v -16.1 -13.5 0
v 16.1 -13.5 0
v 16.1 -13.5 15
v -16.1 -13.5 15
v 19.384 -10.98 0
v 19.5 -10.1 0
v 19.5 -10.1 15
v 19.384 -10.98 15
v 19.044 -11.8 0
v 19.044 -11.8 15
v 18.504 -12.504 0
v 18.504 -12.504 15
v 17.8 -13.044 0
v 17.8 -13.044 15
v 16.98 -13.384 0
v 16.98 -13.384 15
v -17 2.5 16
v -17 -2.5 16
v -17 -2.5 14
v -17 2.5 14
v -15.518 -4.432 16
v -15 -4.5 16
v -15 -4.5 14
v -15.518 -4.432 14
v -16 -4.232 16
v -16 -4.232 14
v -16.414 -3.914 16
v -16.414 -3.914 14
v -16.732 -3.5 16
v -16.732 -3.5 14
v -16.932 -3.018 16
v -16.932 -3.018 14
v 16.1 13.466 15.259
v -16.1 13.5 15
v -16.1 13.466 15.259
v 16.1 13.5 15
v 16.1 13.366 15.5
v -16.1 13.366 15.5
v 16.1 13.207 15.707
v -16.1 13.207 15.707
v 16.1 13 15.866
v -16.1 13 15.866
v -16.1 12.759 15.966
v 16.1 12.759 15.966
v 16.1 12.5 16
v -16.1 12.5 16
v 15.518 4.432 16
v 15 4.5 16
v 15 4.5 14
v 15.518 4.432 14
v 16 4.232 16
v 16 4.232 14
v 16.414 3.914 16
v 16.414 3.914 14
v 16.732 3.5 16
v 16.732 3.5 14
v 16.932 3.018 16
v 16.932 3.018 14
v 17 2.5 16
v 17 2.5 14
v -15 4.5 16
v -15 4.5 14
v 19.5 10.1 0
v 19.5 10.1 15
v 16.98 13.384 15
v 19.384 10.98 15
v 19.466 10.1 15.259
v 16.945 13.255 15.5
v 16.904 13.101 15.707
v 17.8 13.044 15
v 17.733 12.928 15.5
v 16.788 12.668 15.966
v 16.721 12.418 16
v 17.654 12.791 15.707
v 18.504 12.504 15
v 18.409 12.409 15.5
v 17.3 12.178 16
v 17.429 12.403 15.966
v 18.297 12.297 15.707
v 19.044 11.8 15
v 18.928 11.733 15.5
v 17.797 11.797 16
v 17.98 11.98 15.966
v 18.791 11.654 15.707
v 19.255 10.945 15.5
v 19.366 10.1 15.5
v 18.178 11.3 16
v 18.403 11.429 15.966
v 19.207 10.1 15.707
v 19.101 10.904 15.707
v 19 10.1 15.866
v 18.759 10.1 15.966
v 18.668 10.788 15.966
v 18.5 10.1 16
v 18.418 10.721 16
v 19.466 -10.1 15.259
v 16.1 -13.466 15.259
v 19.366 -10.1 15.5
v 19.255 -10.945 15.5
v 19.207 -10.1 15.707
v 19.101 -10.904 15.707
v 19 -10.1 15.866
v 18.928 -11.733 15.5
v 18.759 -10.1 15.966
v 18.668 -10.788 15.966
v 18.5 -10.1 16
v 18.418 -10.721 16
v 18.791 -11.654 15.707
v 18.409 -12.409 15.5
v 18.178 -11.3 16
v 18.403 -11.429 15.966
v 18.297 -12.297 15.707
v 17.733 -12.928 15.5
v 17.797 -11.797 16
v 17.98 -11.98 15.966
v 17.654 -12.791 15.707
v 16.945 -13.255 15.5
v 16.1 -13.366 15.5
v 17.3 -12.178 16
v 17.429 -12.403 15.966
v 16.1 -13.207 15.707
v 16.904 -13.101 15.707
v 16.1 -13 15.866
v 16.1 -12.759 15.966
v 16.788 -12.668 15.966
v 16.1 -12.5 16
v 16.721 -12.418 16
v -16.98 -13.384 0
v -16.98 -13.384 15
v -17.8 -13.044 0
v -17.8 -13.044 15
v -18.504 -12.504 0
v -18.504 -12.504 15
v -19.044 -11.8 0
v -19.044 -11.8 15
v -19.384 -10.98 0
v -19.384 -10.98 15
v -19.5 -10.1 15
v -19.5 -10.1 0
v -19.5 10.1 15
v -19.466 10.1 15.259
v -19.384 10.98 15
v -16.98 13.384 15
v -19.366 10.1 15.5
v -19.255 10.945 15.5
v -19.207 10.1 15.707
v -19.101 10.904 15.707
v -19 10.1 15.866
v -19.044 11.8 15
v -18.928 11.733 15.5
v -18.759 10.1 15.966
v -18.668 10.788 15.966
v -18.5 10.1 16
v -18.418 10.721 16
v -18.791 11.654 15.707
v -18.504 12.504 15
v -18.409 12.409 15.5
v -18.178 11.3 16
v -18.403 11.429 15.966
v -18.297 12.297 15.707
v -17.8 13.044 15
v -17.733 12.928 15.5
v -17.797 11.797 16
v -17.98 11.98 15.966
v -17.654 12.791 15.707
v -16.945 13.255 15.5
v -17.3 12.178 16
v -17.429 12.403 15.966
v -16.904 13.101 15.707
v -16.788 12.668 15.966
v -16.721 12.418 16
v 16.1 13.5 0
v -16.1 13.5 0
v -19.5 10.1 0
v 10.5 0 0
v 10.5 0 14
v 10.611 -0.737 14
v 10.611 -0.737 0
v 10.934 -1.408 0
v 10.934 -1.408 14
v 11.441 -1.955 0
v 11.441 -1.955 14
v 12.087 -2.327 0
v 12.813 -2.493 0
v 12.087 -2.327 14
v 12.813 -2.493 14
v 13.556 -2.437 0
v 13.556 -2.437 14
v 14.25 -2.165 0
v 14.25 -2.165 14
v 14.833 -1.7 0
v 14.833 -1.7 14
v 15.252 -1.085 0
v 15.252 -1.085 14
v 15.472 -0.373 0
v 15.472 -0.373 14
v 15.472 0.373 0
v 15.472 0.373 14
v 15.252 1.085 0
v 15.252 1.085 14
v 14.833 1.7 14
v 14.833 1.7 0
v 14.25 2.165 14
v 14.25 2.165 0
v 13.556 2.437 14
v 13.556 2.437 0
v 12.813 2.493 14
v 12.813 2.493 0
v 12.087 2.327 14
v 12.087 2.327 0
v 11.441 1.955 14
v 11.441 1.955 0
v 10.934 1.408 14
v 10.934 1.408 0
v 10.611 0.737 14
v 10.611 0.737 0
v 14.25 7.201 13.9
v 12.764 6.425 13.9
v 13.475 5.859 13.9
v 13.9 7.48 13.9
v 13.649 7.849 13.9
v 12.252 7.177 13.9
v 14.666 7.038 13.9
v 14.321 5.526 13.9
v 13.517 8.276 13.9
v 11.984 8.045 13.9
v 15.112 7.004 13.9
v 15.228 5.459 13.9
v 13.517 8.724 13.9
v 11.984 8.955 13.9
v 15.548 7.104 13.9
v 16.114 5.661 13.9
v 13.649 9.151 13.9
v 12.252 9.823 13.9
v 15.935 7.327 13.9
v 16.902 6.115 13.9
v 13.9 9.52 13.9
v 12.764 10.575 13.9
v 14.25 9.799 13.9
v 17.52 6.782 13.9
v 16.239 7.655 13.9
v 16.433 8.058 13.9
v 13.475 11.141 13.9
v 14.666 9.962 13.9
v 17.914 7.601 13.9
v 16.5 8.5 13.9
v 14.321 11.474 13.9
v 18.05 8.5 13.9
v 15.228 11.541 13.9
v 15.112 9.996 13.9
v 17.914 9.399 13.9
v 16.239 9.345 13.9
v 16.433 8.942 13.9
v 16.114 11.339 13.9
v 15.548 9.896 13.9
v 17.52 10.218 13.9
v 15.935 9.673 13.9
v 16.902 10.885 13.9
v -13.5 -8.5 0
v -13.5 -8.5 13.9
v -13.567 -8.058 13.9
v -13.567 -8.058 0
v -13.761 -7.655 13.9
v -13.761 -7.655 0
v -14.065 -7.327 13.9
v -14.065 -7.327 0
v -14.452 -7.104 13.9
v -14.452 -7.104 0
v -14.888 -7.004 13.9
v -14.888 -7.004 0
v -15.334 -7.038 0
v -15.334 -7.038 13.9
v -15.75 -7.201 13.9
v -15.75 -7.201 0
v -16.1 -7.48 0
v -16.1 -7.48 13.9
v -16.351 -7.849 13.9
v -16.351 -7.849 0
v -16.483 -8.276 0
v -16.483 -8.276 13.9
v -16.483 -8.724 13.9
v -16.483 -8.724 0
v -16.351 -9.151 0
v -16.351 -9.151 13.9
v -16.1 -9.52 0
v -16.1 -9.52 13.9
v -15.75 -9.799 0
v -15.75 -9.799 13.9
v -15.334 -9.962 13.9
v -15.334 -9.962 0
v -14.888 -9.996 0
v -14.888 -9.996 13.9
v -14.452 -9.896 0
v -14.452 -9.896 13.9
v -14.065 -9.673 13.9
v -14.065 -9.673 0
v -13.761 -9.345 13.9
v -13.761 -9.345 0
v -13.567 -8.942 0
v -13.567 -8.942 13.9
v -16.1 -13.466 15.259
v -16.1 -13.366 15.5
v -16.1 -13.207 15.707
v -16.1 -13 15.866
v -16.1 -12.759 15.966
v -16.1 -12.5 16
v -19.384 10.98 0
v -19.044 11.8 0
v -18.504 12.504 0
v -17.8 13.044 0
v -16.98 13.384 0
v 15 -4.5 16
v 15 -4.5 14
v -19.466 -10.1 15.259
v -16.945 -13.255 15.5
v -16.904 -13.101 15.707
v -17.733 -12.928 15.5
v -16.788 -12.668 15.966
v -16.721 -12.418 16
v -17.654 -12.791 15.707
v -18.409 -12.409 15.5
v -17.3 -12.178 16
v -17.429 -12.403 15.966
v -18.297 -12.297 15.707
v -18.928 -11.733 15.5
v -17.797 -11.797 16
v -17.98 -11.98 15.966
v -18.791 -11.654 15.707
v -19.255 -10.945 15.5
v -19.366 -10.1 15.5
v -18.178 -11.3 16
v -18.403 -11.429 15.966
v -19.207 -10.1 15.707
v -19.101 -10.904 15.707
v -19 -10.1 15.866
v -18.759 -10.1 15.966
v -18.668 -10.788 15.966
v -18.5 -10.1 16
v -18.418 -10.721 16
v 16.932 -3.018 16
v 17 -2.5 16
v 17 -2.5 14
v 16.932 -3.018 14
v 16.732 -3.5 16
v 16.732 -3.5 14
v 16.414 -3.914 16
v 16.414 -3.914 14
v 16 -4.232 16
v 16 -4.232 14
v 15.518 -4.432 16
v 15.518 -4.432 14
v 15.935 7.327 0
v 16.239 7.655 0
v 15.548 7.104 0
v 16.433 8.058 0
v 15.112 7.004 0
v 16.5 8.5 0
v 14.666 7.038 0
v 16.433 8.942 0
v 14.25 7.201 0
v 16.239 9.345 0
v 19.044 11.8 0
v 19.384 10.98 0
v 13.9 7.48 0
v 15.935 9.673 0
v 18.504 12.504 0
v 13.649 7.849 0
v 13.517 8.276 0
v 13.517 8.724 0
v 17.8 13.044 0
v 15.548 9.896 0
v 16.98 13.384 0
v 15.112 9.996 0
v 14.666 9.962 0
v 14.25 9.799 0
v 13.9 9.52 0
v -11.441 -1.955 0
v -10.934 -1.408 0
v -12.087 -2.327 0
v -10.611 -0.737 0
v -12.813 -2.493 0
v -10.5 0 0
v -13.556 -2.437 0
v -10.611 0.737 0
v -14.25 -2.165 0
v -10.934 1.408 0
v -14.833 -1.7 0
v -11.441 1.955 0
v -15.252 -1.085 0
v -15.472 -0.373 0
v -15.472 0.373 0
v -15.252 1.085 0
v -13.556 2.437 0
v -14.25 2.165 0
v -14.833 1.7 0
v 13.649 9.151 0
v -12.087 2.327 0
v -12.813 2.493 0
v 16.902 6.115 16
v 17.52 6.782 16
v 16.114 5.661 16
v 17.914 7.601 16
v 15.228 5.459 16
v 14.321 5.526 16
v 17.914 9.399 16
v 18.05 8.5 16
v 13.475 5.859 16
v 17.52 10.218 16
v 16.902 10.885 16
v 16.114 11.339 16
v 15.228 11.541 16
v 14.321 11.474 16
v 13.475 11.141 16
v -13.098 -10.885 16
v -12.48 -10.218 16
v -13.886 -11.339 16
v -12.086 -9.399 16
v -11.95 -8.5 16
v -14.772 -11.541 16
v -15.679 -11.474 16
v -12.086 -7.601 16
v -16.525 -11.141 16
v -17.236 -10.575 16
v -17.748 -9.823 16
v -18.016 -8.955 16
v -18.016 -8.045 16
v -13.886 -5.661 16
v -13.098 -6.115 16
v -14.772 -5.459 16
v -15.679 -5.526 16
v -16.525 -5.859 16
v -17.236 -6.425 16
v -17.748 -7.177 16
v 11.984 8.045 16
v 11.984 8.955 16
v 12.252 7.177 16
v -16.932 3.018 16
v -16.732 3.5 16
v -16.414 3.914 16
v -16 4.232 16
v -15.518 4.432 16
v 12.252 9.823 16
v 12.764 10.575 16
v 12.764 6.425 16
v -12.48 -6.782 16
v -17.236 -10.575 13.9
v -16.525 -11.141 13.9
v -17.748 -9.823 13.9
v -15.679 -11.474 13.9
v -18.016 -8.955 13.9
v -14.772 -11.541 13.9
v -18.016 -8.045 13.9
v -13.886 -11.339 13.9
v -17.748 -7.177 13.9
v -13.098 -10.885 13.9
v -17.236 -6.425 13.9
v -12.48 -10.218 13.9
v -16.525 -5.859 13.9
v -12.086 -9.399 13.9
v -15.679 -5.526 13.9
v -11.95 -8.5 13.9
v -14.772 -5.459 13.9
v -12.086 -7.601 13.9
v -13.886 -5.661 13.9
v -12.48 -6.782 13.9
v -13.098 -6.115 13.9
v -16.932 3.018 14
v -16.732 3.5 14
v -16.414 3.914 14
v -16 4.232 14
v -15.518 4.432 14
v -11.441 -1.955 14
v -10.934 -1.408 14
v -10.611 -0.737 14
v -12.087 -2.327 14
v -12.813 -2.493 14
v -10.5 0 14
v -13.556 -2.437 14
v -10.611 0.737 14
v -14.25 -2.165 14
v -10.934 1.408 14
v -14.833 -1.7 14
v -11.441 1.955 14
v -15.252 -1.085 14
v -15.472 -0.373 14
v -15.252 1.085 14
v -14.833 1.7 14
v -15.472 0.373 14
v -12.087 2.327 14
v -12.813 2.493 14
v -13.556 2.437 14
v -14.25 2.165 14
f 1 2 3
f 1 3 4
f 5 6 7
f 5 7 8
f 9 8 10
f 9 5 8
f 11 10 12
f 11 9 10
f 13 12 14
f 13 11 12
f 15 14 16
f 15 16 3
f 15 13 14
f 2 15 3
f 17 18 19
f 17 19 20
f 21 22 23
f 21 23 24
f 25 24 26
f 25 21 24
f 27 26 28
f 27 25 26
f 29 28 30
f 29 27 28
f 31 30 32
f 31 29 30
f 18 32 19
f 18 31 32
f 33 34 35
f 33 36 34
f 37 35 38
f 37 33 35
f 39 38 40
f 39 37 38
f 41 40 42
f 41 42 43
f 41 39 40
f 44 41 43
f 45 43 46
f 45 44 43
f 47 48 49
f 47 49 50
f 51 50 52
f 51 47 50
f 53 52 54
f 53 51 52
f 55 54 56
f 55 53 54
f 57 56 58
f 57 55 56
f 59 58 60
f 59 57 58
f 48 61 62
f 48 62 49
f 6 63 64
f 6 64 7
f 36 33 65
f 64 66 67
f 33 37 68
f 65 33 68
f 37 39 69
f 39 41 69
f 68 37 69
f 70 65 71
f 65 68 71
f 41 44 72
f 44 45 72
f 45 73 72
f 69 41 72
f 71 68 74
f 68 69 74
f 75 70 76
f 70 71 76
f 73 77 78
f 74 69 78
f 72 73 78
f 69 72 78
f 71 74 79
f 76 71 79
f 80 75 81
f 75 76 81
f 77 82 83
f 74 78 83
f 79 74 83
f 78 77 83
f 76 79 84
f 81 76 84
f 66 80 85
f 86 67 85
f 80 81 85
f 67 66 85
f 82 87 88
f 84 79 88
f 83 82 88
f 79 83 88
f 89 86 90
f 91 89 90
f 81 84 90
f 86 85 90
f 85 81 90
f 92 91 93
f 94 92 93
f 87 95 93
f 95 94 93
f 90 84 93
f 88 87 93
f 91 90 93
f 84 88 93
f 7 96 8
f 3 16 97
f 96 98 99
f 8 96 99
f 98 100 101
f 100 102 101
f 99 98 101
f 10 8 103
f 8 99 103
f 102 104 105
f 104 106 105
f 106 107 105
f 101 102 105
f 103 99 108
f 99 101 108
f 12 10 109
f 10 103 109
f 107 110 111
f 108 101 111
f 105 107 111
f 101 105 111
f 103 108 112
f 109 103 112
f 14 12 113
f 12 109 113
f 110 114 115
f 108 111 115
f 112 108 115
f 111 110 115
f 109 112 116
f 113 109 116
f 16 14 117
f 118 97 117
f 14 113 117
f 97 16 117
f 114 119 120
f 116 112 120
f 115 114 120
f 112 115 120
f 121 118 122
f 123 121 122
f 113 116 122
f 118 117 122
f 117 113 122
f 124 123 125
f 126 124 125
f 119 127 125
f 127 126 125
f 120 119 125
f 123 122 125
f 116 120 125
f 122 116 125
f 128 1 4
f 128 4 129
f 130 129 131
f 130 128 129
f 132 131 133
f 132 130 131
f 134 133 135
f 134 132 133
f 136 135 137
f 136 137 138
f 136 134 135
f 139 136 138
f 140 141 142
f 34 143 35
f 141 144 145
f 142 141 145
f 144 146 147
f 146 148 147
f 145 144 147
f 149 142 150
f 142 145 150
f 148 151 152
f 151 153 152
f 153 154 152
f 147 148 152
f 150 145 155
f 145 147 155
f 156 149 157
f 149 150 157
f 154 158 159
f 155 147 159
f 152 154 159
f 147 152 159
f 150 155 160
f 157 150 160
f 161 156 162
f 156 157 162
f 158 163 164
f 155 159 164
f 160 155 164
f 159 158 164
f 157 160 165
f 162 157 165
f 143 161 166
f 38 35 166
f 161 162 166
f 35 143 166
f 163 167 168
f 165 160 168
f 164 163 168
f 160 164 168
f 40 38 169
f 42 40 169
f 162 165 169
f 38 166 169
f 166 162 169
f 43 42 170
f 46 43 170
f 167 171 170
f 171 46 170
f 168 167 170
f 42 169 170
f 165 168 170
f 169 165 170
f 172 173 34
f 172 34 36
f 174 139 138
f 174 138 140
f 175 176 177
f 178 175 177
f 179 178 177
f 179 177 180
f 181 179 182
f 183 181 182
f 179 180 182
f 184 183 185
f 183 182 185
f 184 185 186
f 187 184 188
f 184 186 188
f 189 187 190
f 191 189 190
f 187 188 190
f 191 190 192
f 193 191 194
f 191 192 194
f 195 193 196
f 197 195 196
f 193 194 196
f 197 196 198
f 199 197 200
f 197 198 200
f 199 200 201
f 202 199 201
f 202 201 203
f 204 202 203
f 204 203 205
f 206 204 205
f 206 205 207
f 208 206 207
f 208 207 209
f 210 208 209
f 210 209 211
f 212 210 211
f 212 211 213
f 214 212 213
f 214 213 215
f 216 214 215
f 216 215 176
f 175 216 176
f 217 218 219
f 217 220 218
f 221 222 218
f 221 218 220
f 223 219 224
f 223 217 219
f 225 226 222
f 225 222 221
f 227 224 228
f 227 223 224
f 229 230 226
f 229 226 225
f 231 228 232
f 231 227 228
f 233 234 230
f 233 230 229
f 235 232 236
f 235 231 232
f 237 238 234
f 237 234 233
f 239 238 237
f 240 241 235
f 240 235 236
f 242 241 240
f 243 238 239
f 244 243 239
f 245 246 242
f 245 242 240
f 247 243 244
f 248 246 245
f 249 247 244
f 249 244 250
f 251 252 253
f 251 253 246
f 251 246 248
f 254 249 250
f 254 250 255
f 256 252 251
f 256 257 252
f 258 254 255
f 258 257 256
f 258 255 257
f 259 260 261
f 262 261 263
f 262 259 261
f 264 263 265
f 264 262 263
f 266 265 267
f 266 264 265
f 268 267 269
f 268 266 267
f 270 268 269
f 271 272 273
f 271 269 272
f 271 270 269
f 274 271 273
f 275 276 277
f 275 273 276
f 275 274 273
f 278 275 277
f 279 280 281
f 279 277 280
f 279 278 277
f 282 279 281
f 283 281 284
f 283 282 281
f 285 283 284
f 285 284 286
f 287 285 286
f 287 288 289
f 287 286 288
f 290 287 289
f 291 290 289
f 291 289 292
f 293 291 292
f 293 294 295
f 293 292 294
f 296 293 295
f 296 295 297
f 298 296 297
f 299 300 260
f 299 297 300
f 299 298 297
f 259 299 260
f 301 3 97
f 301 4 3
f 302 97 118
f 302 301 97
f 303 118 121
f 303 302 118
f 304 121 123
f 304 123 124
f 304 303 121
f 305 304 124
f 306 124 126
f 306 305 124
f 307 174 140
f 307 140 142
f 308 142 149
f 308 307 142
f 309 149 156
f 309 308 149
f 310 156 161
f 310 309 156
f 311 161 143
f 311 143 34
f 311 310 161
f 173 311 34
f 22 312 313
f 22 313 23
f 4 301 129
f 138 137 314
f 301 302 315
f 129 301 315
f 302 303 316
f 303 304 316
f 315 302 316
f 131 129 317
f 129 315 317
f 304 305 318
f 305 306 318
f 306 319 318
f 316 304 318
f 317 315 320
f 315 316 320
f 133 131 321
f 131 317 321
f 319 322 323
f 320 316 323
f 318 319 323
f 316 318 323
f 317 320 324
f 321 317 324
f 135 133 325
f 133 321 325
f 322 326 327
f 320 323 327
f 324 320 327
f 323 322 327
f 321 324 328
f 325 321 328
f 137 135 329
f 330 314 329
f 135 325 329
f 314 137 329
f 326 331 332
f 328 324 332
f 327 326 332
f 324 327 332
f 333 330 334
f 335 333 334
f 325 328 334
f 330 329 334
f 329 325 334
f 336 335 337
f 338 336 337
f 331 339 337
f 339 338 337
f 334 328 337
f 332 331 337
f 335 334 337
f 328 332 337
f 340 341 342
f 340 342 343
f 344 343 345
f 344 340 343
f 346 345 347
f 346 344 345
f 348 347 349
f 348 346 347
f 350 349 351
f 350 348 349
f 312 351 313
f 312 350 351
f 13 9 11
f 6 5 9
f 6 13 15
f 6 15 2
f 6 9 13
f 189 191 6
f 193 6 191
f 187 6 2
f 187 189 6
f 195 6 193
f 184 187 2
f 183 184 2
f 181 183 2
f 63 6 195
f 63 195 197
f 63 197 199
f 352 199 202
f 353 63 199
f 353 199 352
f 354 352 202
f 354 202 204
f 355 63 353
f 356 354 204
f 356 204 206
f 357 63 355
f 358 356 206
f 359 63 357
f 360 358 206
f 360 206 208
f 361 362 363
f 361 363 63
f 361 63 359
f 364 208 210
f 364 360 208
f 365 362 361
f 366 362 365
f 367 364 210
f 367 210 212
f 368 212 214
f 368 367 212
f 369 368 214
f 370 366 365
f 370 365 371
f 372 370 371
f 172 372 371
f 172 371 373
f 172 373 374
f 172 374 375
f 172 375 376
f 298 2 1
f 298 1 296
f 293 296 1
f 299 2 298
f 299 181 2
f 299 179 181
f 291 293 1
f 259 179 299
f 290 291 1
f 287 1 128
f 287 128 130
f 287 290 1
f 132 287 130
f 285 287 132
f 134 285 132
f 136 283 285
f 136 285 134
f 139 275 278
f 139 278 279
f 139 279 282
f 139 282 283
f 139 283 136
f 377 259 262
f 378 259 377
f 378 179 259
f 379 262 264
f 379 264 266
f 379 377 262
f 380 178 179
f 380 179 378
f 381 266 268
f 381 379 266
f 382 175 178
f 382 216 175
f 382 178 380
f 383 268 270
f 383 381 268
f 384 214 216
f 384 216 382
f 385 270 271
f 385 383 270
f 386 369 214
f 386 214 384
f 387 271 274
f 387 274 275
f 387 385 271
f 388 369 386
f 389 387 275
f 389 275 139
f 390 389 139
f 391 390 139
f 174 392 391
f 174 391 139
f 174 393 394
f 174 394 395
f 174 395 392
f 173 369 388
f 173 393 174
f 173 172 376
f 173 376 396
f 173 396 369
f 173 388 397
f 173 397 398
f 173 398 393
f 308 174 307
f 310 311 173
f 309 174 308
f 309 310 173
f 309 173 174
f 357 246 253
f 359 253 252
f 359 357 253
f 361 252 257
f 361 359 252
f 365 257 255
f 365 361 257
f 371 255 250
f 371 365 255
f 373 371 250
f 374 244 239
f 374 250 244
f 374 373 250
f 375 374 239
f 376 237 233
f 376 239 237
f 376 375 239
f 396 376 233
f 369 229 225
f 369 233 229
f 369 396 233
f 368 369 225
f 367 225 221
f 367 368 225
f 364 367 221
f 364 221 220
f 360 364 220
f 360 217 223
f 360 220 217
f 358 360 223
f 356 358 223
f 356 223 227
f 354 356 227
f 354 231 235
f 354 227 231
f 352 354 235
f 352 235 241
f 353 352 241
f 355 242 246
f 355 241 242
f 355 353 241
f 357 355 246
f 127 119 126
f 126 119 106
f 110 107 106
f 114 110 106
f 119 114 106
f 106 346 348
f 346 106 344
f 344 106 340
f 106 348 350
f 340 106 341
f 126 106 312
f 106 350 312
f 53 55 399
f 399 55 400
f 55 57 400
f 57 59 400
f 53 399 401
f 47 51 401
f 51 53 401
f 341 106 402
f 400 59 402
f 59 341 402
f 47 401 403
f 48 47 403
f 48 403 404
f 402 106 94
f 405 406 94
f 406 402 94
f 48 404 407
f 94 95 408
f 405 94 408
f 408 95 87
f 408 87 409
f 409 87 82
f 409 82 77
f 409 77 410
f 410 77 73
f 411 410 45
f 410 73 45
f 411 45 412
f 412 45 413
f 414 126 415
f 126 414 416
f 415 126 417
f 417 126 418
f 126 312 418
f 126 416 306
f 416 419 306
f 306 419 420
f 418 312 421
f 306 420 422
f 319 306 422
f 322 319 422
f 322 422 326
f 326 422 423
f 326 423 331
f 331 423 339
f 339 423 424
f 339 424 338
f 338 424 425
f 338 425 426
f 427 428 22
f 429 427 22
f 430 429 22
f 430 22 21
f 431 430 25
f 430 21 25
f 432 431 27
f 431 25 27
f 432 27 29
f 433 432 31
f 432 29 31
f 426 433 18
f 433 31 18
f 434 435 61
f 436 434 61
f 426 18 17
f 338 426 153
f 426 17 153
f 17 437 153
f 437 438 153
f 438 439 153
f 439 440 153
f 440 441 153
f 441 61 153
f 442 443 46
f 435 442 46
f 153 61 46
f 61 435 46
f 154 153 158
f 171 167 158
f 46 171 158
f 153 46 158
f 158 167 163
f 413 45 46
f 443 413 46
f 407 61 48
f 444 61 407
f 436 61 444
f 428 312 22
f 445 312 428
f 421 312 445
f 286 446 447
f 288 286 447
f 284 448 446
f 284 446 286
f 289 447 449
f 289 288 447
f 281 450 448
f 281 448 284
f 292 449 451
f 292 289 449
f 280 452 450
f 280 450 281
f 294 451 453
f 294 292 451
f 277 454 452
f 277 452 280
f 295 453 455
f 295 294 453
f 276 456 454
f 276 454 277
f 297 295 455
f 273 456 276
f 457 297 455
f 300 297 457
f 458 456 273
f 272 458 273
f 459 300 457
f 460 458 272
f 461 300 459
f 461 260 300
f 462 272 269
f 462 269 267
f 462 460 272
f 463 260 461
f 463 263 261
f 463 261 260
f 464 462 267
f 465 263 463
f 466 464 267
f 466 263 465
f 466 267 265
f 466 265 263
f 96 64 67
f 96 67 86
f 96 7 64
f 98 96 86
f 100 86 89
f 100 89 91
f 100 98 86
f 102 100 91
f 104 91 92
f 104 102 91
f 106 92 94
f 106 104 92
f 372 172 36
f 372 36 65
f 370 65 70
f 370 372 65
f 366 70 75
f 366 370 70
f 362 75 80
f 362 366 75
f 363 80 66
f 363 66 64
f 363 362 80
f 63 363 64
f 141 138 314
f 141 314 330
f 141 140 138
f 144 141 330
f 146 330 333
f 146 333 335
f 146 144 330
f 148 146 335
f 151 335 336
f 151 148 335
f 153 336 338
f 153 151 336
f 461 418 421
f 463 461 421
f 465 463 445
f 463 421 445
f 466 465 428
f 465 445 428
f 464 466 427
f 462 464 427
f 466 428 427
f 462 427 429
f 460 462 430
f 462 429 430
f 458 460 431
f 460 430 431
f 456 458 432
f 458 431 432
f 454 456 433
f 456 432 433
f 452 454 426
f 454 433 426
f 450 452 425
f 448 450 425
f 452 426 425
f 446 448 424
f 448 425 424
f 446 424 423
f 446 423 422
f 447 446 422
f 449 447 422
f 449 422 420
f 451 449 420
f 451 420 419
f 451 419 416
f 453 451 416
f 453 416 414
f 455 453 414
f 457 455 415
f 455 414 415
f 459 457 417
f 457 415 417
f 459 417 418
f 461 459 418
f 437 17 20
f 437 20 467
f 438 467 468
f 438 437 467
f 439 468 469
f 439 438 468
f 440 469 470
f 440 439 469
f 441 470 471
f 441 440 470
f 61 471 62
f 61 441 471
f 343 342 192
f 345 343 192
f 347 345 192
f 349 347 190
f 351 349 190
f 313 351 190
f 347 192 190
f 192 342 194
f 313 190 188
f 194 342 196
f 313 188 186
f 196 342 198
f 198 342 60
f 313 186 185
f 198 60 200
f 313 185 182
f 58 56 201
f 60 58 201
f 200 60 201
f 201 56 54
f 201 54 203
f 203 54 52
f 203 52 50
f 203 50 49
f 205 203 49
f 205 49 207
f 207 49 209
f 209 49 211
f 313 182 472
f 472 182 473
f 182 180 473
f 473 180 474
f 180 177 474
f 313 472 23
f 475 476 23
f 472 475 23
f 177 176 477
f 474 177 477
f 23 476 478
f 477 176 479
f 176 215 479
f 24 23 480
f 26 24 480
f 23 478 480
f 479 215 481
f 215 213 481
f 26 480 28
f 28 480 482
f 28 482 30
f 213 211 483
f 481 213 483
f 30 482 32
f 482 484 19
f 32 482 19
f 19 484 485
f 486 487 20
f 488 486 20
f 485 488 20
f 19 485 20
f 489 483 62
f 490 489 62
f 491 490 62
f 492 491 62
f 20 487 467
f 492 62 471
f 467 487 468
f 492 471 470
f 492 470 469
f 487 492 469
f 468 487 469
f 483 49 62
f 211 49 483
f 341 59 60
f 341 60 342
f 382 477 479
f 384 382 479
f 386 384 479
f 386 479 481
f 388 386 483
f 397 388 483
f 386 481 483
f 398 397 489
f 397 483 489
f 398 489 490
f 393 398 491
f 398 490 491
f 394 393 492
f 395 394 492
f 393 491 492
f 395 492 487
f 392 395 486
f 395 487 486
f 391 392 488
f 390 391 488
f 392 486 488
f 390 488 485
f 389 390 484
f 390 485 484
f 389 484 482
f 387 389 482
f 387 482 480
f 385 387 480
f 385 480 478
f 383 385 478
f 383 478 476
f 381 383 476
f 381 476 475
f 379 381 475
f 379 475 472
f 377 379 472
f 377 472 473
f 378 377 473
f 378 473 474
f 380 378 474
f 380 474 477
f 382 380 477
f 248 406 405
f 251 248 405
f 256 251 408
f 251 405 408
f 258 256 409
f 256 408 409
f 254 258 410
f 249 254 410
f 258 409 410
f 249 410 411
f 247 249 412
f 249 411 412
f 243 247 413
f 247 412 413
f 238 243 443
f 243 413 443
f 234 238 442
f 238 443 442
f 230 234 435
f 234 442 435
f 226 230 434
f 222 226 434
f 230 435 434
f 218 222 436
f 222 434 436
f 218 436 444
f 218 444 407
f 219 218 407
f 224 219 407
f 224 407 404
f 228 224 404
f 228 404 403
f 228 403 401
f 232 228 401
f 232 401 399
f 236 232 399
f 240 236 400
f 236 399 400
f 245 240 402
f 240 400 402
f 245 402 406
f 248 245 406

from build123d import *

# Parameters (mm, degrees)
SKIZZE1_R                       = 1.5
AUFSATZ_LINEAR_AUSTRAGEN1_DEPTH = 16
SCHNITT_LINEAR_AUSTRAGEN1_DEPTH = 2
SKIZZE3_R                       = 2.5
SCHNITT_LINEAR_AUSTRAGEN2_DEPTH = 28.540878708
SKIZZE4_R                       = 3.05
SCHNITT_LINEAR_AUSTRAGEN3_DEPTH = 2.1
VERRUNDUNG1_R                   = 1


with BuildPart() as part:
    # Skizze1 → Aufsatz-Linear austragen1 (new body)
    with BuildSketch(Plane.XY):
        with BuildLine():
            Line((-16.1, 13.5), (16.1, 13.5))
            ThreePointArc((16.1, 13.5), (18.504163056, 12.504163056), (19.5, 10.1))
            Line((19.5, 10.1), (19.5, -10.1))
            ThreePointArc((19.5, -10.1), (18.504163056, -12.504163056), (16.1, -13.5))
            Line((16.1, -13.5), (-16.1, -13.5))
            ThreePointArc((-16.1, -13.5), (-18.504163056, -12.504163056), (-19.5, -10.1))
            Line((-19.5, -10.1), (-19.5, 10.1))
            ThreePointArc((-19.5, 10.1), (-18.504163056, 12.504163056), (-16.1, 13.5))
        make_face()
        with Locations((15, 8.5)):
            Circle(SKIZZE1_R, mode=Mode.SUBTRACT)
        with Locations((-15, -8.5)):
            Circle(SKIZZE1_R, mode=Mode.SUBTRACT)
    extrude(amount=AUFSATZ_LINEAR_AUSTRAGEN1_DEPTH)

    # Skizze2 → Schnitt-Linear austragen1 (cut)
    with BuildSketch(Plane.XY.offset(16)):
        with BuildLine():
            Line((-15, 4.5), (15, 4.5))
            ThreePointArc((15, 4.5), (16.414213562, 3.914213562), (17, 2.5))
            Line((17, 2.5), (17, -2.5))
            ThreePointArc((17, -2.5), (16.414213562, -3.914213562), (15, -4.5))
            Line((15, -4.5), (-15, -4.5))
            ThreePointArc((-15, -4.5), (-16.414213562, -3.914213562), (-17, -2.5))
            Line((-17, -2.5), (-17, 2.5))
            ThreePointArc((-17, 2.5), (-16.414213562, 3.914213562), (-15, 4.5))
        make_face()
    extrude(amount=-SCHNITT_LINEAR_AUSTRAGEN1_DEPTH, mode=Mode.SUBTRACT)

    # Skizze3 → Schnitt-Linear austragen2 (cut, through all)
    with BuildSketch(Plane.XY.offset(14)):
        with Locations((-13, 0)):
            Circle(SKIZZE3_R)
        with Locations(Location((13, 0, 0), (0, 0, 180))):
            Circle(SKIZZE3_R)
    extrude(amount=-SCHNITT_LINEAR_AUSTRAGEN2_DEPTH, mode=Mode.SUBTRACT)

    # Skizze4 → Schnitt-Linear austragen3 (cut)
    with BuildSketch(Plane.XY.offset(16)):
        with Locations((15, 8.5)):
            Circle(SKIZZE4_R)
        with Locations((-15, -8.5)):
            Circle(SKIZZE4_R)
    extrude(amount=-SCHNITT_LINEAR_AUSTRAGEN3_DEPTH, mode=Mode.SUBTRACT)

    # Verrundung1
    verrundung1_edges = [part.edges().sort_by_distance(p)[0] for p in [
        (-18.504163056, 12.504163056, 16),
        (-19.5, 0, 16),
        (-18.504163056, -12.504163056, 16),
        (0, -13.5, 16),
        (18.504163056, -12.504163056, 16),
        (19.5, 0, 16),
        (18.504163056, 12.504163056, 16),
        (0, 13.5, 16),
    ]]
    fillet(verrundung1_edges, radius=VERRUNDUNG1_R)


solid = part.part
